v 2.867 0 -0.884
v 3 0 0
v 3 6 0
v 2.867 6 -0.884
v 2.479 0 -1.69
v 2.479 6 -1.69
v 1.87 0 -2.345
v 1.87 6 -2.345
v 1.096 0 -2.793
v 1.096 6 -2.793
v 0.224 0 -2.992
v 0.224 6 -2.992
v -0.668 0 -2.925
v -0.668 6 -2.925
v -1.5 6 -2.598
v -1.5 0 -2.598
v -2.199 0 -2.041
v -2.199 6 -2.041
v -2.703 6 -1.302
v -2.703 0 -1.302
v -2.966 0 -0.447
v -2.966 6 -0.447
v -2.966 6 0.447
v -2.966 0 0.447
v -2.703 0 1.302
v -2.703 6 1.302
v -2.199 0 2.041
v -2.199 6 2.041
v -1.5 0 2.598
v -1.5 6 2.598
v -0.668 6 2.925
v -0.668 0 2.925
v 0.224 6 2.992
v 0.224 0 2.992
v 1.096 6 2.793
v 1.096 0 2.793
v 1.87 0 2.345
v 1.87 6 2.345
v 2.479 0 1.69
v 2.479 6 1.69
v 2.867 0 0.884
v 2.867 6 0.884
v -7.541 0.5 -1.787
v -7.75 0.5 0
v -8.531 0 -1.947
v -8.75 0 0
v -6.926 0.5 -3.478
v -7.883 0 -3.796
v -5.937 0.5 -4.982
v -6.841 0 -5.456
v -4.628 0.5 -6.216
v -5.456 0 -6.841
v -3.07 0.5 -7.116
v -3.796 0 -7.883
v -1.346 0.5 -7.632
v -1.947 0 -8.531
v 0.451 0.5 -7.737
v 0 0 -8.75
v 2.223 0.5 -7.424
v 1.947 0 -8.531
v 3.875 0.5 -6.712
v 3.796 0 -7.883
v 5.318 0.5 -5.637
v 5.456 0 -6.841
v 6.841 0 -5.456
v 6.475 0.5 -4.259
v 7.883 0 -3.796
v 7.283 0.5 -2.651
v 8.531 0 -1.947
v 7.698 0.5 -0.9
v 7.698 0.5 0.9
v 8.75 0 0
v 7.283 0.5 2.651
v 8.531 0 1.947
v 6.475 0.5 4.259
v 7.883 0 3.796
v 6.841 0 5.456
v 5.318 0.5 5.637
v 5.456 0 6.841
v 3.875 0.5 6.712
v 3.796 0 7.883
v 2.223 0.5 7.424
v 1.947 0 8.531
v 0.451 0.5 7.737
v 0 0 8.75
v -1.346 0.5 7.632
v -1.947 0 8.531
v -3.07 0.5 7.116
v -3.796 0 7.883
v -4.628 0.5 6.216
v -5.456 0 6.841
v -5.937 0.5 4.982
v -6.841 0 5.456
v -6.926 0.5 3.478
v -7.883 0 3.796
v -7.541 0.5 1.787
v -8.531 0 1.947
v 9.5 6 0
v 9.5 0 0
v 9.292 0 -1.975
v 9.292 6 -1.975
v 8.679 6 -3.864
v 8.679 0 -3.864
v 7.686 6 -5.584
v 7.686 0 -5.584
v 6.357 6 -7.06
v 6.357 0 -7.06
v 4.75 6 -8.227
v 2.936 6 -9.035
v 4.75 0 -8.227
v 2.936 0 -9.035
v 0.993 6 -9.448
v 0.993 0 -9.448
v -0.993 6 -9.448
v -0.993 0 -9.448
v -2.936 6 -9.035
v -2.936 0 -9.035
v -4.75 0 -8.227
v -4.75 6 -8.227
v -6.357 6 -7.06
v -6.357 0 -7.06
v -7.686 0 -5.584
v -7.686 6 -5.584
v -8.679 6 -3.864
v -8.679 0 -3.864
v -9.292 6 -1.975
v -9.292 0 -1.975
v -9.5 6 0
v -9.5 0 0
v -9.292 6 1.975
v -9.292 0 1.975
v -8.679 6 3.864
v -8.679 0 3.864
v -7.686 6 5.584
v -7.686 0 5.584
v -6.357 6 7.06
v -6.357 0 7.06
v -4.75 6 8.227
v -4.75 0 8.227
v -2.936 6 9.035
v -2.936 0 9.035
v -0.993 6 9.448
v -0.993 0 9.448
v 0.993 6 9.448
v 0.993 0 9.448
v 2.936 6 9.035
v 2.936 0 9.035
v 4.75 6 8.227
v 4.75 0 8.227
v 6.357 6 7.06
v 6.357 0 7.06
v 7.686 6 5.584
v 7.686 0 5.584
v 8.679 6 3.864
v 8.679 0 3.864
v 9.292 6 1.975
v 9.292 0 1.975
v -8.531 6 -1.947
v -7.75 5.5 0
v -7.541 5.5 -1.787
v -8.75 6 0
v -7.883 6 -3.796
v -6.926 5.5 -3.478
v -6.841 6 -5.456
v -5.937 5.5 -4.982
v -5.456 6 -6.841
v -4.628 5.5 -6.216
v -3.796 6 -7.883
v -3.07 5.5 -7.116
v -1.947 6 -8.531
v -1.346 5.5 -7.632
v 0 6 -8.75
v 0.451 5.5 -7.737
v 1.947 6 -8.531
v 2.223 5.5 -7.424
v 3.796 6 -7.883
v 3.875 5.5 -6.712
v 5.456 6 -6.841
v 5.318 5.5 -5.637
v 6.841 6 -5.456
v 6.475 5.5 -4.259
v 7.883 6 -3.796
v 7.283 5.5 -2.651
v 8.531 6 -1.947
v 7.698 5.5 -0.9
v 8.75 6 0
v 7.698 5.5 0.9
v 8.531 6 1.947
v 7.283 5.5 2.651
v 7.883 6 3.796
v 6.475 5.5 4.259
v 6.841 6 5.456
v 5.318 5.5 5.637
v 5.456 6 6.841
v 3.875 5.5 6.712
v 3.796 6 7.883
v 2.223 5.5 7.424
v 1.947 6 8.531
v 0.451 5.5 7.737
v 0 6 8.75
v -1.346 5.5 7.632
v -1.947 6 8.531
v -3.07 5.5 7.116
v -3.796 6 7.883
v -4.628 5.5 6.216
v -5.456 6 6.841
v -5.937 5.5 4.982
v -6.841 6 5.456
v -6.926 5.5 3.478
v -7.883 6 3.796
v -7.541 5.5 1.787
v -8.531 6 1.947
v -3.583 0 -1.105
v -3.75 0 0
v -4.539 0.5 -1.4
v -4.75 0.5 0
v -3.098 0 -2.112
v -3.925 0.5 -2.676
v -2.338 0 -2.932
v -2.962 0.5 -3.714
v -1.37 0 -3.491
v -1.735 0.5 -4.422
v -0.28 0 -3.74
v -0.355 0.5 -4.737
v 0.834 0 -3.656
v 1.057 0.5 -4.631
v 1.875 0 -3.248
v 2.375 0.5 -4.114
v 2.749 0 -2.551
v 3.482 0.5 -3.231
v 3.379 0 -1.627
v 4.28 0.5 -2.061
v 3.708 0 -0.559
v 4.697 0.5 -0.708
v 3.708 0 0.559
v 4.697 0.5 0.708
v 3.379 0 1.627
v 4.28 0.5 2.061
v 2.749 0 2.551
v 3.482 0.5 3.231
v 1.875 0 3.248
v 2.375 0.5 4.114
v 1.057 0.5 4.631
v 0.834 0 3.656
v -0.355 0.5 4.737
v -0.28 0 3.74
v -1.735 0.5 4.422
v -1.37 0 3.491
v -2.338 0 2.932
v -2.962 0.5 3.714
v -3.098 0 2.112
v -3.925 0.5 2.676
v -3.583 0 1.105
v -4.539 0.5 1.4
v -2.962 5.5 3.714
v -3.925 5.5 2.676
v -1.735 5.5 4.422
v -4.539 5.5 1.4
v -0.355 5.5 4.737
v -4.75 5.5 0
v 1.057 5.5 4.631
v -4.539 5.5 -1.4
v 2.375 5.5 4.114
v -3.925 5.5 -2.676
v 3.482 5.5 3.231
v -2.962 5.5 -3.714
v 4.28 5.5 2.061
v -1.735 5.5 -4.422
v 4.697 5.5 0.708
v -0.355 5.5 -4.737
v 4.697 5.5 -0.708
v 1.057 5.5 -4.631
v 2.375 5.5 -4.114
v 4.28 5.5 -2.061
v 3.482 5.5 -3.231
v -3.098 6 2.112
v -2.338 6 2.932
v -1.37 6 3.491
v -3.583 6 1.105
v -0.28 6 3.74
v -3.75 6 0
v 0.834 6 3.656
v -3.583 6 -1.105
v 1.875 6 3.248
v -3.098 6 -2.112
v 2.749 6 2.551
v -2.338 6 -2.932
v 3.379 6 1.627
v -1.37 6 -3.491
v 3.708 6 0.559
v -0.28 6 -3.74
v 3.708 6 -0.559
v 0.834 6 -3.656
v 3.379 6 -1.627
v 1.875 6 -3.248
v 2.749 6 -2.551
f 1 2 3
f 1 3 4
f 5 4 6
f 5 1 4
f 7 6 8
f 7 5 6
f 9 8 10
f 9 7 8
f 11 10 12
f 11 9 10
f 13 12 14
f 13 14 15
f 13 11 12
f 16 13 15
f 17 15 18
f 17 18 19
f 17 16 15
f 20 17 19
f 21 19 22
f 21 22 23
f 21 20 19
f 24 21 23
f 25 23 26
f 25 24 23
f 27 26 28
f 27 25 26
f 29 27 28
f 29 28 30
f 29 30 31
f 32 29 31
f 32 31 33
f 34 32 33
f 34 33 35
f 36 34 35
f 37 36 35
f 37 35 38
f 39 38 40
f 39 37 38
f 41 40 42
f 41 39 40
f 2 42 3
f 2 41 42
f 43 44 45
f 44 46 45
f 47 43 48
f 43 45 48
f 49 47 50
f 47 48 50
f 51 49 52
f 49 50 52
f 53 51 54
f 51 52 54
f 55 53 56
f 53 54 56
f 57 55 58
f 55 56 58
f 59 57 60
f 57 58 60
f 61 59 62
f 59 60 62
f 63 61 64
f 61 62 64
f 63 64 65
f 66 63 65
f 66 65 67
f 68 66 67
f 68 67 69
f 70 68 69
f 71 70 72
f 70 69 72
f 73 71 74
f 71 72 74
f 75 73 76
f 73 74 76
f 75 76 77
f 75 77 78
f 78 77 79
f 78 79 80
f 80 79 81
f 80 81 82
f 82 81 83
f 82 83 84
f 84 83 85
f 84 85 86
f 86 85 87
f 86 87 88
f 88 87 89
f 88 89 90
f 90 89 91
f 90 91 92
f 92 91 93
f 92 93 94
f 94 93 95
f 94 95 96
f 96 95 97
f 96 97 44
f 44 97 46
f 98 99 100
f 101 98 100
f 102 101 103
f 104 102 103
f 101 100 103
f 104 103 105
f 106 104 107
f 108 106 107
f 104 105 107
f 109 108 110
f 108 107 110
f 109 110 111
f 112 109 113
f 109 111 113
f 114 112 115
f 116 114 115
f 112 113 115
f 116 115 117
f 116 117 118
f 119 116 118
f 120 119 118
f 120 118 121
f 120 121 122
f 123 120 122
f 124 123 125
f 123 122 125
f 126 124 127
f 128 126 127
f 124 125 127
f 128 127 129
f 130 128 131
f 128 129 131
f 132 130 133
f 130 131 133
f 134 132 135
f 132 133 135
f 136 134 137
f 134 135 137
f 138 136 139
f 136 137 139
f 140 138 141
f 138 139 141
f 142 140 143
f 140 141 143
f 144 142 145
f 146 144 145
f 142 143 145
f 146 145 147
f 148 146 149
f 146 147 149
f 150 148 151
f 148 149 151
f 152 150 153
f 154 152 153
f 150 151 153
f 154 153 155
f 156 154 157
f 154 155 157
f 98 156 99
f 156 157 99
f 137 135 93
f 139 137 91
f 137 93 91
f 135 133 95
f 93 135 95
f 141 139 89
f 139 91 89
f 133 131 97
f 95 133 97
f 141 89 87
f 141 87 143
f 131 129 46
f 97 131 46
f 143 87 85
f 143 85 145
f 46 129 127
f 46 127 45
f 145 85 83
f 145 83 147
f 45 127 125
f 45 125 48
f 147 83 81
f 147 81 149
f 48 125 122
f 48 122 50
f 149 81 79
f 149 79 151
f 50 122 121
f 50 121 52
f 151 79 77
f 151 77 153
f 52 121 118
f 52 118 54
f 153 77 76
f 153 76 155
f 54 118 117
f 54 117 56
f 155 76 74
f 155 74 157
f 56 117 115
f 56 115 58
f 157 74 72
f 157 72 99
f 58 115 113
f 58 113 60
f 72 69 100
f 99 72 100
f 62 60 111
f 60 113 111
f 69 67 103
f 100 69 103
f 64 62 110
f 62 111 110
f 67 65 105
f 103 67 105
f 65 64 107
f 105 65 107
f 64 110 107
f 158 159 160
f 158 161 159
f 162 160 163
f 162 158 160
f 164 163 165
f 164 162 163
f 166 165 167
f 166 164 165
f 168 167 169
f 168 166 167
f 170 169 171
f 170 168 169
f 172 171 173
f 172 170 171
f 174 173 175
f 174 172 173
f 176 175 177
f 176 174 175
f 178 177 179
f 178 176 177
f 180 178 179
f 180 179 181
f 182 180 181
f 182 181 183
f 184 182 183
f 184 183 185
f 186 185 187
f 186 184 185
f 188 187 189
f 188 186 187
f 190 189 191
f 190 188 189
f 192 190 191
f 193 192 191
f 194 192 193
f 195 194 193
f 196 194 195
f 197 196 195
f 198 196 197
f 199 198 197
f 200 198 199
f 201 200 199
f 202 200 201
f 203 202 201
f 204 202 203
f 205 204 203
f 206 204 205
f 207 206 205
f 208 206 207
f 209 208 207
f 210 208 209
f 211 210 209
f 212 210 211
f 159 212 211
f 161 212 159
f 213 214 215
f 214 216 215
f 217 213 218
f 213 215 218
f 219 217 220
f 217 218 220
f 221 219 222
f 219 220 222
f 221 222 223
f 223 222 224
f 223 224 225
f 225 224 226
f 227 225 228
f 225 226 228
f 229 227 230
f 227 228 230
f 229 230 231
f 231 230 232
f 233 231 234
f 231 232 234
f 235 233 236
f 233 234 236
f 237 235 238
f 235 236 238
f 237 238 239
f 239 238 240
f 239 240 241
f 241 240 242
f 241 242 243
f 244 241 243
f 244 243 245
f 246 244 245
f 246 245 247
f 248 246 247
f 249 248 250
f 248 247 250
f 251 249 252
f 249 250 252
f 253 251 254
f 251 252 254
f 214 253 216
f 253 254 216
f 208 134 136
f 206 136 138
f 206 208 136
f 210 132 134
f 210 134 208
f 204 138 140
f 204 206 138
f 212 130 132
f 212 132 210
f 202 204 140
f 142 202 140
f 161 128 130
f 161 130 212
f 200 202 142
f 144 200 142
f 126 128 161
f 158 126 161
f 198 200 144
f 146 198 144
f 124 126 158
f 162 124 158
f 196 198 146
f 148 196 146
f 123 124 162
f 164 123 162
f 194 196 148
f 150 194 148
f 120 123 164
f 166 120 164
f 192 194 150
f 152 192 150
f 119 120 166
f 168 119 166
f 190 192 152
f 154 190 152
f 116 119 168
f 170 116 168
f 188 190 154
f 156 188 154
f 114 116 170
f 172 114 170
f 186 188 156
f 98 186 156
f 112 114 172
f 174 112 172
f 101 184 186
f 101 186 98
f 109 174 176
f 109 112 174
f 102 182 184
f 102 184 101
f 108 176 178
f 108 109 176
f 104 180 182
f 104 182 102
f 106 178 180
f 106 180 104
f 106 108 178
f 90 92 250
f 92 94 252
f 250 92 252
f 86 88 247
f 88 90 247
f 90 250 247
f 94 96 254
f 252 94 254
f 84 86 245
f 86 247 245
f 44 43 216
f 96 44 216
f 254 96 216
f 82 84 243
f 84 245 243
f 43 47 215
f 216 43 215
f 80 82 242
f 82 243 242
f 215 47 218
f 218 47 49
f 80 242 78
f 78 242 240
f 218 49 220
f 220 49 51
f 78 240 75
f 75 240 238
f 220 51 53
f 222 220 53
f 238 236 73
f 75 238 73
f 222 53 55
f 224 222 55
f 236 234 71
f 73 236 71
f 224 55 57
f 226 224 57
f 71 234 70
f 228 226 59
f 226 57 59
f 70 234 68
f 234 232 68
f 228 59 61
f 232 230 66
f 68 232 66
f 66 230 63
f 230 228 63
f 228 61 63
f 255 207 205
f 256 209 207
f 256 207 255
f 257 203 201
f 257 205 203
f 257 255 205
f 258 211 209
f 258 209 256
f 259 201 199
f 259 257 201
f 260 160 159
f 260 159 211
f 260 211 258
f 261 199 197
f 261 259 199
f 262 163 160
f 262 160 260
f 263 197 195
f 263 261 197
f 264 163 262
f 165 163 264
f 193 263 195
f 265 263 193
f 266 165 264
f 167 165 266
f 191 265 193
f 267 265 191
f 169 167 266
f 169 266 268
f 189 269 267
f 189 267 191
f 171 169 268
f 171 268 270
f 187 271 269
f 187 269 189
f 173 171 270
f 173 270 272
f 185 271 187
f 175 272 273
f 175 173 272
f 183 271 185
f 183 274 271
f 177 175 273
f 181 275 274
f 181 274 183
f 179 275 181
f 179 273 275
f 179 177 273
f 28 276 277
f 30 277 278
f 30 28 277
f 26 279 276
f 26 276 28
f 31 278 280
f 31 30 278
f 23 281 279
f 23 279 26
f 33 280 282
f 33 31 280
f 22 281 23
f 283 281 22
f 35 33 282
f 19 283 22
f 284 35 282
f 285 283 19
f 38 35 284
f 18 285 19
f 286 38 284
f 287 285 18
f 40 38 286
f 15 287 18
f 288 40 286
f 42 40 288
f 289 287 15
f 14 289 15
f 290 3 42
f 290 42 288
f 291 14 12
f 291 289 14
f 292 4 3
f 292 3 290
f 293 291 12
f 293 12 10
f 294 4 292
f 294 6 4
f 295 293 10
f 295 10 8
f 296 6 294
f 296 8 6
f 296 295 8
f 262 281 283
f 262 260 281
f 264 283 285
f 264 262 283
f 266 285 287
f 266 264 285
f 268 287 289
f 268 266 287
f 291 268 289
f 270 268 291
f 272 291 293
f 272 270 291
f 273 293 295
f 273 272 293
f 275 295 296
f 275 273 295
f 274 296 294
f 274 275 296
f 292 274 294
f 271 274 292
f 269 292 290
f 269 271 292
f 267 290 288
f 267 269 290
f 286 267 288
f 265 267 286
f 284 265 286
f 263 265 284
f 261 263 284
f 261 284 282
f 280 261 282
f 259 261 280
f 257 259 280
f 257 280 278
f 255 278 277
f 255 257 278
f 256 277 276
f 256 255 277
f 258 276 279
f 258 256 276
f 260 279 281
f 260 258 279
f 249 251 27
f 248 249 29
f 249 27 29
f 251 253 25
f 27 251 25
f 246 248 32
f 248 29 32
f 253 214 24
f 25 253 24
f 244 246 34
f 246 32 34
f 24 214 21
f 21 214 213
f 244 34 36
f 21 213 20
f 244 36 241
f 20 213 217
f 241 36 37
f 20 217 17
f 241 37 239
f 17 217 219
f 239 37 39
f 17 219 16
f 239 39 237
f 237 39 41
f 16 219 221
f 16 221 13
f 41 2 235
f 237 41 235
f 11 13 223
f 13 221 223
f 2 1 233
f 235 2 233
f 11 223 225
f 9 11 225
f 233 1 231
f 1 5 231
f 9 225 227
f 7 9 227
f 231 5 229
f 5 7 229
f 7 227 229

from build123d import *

# Parameters (mm, degrees)
SKETCH1_R           = 9.5
SKETCH1_R_2         = 3
BOSS_EXTRUDE1_DEPTH = 6


with BuildPart() as part:
    # Sketch1 → Boss-Extrude1 (new body)
    with BuildSketch(Plane(origin=(0, 0, 0), x_dir=(1, 0, 0), z_dir=(0, 1, 0))):
        Circle(SKETCH1_R)
        Circle(SKETCH1_R_2, mode=Mode.SUBTRACT)
    extrude(amount=BOSS_EXTRUDE1_DEPTH)

    # Sketch2 → Cut-Revolve1 (revolve, cut)
    with BuildSketch(Plane.XY):
        Polygon((-3.75, 6), (-4.75, 5.5), (-7.75, 5.5), (-8.75, 6), align=None)
        Polygon((-8.75, 0), (-3.75, 0), (-4.75, 0.5), (-7.75, 0.5), align=None)
    revolve(axis=Axis((0, 6, 0), (0, -1, 0)), mode=Mode.SUBTRACT)


solid = part.part
